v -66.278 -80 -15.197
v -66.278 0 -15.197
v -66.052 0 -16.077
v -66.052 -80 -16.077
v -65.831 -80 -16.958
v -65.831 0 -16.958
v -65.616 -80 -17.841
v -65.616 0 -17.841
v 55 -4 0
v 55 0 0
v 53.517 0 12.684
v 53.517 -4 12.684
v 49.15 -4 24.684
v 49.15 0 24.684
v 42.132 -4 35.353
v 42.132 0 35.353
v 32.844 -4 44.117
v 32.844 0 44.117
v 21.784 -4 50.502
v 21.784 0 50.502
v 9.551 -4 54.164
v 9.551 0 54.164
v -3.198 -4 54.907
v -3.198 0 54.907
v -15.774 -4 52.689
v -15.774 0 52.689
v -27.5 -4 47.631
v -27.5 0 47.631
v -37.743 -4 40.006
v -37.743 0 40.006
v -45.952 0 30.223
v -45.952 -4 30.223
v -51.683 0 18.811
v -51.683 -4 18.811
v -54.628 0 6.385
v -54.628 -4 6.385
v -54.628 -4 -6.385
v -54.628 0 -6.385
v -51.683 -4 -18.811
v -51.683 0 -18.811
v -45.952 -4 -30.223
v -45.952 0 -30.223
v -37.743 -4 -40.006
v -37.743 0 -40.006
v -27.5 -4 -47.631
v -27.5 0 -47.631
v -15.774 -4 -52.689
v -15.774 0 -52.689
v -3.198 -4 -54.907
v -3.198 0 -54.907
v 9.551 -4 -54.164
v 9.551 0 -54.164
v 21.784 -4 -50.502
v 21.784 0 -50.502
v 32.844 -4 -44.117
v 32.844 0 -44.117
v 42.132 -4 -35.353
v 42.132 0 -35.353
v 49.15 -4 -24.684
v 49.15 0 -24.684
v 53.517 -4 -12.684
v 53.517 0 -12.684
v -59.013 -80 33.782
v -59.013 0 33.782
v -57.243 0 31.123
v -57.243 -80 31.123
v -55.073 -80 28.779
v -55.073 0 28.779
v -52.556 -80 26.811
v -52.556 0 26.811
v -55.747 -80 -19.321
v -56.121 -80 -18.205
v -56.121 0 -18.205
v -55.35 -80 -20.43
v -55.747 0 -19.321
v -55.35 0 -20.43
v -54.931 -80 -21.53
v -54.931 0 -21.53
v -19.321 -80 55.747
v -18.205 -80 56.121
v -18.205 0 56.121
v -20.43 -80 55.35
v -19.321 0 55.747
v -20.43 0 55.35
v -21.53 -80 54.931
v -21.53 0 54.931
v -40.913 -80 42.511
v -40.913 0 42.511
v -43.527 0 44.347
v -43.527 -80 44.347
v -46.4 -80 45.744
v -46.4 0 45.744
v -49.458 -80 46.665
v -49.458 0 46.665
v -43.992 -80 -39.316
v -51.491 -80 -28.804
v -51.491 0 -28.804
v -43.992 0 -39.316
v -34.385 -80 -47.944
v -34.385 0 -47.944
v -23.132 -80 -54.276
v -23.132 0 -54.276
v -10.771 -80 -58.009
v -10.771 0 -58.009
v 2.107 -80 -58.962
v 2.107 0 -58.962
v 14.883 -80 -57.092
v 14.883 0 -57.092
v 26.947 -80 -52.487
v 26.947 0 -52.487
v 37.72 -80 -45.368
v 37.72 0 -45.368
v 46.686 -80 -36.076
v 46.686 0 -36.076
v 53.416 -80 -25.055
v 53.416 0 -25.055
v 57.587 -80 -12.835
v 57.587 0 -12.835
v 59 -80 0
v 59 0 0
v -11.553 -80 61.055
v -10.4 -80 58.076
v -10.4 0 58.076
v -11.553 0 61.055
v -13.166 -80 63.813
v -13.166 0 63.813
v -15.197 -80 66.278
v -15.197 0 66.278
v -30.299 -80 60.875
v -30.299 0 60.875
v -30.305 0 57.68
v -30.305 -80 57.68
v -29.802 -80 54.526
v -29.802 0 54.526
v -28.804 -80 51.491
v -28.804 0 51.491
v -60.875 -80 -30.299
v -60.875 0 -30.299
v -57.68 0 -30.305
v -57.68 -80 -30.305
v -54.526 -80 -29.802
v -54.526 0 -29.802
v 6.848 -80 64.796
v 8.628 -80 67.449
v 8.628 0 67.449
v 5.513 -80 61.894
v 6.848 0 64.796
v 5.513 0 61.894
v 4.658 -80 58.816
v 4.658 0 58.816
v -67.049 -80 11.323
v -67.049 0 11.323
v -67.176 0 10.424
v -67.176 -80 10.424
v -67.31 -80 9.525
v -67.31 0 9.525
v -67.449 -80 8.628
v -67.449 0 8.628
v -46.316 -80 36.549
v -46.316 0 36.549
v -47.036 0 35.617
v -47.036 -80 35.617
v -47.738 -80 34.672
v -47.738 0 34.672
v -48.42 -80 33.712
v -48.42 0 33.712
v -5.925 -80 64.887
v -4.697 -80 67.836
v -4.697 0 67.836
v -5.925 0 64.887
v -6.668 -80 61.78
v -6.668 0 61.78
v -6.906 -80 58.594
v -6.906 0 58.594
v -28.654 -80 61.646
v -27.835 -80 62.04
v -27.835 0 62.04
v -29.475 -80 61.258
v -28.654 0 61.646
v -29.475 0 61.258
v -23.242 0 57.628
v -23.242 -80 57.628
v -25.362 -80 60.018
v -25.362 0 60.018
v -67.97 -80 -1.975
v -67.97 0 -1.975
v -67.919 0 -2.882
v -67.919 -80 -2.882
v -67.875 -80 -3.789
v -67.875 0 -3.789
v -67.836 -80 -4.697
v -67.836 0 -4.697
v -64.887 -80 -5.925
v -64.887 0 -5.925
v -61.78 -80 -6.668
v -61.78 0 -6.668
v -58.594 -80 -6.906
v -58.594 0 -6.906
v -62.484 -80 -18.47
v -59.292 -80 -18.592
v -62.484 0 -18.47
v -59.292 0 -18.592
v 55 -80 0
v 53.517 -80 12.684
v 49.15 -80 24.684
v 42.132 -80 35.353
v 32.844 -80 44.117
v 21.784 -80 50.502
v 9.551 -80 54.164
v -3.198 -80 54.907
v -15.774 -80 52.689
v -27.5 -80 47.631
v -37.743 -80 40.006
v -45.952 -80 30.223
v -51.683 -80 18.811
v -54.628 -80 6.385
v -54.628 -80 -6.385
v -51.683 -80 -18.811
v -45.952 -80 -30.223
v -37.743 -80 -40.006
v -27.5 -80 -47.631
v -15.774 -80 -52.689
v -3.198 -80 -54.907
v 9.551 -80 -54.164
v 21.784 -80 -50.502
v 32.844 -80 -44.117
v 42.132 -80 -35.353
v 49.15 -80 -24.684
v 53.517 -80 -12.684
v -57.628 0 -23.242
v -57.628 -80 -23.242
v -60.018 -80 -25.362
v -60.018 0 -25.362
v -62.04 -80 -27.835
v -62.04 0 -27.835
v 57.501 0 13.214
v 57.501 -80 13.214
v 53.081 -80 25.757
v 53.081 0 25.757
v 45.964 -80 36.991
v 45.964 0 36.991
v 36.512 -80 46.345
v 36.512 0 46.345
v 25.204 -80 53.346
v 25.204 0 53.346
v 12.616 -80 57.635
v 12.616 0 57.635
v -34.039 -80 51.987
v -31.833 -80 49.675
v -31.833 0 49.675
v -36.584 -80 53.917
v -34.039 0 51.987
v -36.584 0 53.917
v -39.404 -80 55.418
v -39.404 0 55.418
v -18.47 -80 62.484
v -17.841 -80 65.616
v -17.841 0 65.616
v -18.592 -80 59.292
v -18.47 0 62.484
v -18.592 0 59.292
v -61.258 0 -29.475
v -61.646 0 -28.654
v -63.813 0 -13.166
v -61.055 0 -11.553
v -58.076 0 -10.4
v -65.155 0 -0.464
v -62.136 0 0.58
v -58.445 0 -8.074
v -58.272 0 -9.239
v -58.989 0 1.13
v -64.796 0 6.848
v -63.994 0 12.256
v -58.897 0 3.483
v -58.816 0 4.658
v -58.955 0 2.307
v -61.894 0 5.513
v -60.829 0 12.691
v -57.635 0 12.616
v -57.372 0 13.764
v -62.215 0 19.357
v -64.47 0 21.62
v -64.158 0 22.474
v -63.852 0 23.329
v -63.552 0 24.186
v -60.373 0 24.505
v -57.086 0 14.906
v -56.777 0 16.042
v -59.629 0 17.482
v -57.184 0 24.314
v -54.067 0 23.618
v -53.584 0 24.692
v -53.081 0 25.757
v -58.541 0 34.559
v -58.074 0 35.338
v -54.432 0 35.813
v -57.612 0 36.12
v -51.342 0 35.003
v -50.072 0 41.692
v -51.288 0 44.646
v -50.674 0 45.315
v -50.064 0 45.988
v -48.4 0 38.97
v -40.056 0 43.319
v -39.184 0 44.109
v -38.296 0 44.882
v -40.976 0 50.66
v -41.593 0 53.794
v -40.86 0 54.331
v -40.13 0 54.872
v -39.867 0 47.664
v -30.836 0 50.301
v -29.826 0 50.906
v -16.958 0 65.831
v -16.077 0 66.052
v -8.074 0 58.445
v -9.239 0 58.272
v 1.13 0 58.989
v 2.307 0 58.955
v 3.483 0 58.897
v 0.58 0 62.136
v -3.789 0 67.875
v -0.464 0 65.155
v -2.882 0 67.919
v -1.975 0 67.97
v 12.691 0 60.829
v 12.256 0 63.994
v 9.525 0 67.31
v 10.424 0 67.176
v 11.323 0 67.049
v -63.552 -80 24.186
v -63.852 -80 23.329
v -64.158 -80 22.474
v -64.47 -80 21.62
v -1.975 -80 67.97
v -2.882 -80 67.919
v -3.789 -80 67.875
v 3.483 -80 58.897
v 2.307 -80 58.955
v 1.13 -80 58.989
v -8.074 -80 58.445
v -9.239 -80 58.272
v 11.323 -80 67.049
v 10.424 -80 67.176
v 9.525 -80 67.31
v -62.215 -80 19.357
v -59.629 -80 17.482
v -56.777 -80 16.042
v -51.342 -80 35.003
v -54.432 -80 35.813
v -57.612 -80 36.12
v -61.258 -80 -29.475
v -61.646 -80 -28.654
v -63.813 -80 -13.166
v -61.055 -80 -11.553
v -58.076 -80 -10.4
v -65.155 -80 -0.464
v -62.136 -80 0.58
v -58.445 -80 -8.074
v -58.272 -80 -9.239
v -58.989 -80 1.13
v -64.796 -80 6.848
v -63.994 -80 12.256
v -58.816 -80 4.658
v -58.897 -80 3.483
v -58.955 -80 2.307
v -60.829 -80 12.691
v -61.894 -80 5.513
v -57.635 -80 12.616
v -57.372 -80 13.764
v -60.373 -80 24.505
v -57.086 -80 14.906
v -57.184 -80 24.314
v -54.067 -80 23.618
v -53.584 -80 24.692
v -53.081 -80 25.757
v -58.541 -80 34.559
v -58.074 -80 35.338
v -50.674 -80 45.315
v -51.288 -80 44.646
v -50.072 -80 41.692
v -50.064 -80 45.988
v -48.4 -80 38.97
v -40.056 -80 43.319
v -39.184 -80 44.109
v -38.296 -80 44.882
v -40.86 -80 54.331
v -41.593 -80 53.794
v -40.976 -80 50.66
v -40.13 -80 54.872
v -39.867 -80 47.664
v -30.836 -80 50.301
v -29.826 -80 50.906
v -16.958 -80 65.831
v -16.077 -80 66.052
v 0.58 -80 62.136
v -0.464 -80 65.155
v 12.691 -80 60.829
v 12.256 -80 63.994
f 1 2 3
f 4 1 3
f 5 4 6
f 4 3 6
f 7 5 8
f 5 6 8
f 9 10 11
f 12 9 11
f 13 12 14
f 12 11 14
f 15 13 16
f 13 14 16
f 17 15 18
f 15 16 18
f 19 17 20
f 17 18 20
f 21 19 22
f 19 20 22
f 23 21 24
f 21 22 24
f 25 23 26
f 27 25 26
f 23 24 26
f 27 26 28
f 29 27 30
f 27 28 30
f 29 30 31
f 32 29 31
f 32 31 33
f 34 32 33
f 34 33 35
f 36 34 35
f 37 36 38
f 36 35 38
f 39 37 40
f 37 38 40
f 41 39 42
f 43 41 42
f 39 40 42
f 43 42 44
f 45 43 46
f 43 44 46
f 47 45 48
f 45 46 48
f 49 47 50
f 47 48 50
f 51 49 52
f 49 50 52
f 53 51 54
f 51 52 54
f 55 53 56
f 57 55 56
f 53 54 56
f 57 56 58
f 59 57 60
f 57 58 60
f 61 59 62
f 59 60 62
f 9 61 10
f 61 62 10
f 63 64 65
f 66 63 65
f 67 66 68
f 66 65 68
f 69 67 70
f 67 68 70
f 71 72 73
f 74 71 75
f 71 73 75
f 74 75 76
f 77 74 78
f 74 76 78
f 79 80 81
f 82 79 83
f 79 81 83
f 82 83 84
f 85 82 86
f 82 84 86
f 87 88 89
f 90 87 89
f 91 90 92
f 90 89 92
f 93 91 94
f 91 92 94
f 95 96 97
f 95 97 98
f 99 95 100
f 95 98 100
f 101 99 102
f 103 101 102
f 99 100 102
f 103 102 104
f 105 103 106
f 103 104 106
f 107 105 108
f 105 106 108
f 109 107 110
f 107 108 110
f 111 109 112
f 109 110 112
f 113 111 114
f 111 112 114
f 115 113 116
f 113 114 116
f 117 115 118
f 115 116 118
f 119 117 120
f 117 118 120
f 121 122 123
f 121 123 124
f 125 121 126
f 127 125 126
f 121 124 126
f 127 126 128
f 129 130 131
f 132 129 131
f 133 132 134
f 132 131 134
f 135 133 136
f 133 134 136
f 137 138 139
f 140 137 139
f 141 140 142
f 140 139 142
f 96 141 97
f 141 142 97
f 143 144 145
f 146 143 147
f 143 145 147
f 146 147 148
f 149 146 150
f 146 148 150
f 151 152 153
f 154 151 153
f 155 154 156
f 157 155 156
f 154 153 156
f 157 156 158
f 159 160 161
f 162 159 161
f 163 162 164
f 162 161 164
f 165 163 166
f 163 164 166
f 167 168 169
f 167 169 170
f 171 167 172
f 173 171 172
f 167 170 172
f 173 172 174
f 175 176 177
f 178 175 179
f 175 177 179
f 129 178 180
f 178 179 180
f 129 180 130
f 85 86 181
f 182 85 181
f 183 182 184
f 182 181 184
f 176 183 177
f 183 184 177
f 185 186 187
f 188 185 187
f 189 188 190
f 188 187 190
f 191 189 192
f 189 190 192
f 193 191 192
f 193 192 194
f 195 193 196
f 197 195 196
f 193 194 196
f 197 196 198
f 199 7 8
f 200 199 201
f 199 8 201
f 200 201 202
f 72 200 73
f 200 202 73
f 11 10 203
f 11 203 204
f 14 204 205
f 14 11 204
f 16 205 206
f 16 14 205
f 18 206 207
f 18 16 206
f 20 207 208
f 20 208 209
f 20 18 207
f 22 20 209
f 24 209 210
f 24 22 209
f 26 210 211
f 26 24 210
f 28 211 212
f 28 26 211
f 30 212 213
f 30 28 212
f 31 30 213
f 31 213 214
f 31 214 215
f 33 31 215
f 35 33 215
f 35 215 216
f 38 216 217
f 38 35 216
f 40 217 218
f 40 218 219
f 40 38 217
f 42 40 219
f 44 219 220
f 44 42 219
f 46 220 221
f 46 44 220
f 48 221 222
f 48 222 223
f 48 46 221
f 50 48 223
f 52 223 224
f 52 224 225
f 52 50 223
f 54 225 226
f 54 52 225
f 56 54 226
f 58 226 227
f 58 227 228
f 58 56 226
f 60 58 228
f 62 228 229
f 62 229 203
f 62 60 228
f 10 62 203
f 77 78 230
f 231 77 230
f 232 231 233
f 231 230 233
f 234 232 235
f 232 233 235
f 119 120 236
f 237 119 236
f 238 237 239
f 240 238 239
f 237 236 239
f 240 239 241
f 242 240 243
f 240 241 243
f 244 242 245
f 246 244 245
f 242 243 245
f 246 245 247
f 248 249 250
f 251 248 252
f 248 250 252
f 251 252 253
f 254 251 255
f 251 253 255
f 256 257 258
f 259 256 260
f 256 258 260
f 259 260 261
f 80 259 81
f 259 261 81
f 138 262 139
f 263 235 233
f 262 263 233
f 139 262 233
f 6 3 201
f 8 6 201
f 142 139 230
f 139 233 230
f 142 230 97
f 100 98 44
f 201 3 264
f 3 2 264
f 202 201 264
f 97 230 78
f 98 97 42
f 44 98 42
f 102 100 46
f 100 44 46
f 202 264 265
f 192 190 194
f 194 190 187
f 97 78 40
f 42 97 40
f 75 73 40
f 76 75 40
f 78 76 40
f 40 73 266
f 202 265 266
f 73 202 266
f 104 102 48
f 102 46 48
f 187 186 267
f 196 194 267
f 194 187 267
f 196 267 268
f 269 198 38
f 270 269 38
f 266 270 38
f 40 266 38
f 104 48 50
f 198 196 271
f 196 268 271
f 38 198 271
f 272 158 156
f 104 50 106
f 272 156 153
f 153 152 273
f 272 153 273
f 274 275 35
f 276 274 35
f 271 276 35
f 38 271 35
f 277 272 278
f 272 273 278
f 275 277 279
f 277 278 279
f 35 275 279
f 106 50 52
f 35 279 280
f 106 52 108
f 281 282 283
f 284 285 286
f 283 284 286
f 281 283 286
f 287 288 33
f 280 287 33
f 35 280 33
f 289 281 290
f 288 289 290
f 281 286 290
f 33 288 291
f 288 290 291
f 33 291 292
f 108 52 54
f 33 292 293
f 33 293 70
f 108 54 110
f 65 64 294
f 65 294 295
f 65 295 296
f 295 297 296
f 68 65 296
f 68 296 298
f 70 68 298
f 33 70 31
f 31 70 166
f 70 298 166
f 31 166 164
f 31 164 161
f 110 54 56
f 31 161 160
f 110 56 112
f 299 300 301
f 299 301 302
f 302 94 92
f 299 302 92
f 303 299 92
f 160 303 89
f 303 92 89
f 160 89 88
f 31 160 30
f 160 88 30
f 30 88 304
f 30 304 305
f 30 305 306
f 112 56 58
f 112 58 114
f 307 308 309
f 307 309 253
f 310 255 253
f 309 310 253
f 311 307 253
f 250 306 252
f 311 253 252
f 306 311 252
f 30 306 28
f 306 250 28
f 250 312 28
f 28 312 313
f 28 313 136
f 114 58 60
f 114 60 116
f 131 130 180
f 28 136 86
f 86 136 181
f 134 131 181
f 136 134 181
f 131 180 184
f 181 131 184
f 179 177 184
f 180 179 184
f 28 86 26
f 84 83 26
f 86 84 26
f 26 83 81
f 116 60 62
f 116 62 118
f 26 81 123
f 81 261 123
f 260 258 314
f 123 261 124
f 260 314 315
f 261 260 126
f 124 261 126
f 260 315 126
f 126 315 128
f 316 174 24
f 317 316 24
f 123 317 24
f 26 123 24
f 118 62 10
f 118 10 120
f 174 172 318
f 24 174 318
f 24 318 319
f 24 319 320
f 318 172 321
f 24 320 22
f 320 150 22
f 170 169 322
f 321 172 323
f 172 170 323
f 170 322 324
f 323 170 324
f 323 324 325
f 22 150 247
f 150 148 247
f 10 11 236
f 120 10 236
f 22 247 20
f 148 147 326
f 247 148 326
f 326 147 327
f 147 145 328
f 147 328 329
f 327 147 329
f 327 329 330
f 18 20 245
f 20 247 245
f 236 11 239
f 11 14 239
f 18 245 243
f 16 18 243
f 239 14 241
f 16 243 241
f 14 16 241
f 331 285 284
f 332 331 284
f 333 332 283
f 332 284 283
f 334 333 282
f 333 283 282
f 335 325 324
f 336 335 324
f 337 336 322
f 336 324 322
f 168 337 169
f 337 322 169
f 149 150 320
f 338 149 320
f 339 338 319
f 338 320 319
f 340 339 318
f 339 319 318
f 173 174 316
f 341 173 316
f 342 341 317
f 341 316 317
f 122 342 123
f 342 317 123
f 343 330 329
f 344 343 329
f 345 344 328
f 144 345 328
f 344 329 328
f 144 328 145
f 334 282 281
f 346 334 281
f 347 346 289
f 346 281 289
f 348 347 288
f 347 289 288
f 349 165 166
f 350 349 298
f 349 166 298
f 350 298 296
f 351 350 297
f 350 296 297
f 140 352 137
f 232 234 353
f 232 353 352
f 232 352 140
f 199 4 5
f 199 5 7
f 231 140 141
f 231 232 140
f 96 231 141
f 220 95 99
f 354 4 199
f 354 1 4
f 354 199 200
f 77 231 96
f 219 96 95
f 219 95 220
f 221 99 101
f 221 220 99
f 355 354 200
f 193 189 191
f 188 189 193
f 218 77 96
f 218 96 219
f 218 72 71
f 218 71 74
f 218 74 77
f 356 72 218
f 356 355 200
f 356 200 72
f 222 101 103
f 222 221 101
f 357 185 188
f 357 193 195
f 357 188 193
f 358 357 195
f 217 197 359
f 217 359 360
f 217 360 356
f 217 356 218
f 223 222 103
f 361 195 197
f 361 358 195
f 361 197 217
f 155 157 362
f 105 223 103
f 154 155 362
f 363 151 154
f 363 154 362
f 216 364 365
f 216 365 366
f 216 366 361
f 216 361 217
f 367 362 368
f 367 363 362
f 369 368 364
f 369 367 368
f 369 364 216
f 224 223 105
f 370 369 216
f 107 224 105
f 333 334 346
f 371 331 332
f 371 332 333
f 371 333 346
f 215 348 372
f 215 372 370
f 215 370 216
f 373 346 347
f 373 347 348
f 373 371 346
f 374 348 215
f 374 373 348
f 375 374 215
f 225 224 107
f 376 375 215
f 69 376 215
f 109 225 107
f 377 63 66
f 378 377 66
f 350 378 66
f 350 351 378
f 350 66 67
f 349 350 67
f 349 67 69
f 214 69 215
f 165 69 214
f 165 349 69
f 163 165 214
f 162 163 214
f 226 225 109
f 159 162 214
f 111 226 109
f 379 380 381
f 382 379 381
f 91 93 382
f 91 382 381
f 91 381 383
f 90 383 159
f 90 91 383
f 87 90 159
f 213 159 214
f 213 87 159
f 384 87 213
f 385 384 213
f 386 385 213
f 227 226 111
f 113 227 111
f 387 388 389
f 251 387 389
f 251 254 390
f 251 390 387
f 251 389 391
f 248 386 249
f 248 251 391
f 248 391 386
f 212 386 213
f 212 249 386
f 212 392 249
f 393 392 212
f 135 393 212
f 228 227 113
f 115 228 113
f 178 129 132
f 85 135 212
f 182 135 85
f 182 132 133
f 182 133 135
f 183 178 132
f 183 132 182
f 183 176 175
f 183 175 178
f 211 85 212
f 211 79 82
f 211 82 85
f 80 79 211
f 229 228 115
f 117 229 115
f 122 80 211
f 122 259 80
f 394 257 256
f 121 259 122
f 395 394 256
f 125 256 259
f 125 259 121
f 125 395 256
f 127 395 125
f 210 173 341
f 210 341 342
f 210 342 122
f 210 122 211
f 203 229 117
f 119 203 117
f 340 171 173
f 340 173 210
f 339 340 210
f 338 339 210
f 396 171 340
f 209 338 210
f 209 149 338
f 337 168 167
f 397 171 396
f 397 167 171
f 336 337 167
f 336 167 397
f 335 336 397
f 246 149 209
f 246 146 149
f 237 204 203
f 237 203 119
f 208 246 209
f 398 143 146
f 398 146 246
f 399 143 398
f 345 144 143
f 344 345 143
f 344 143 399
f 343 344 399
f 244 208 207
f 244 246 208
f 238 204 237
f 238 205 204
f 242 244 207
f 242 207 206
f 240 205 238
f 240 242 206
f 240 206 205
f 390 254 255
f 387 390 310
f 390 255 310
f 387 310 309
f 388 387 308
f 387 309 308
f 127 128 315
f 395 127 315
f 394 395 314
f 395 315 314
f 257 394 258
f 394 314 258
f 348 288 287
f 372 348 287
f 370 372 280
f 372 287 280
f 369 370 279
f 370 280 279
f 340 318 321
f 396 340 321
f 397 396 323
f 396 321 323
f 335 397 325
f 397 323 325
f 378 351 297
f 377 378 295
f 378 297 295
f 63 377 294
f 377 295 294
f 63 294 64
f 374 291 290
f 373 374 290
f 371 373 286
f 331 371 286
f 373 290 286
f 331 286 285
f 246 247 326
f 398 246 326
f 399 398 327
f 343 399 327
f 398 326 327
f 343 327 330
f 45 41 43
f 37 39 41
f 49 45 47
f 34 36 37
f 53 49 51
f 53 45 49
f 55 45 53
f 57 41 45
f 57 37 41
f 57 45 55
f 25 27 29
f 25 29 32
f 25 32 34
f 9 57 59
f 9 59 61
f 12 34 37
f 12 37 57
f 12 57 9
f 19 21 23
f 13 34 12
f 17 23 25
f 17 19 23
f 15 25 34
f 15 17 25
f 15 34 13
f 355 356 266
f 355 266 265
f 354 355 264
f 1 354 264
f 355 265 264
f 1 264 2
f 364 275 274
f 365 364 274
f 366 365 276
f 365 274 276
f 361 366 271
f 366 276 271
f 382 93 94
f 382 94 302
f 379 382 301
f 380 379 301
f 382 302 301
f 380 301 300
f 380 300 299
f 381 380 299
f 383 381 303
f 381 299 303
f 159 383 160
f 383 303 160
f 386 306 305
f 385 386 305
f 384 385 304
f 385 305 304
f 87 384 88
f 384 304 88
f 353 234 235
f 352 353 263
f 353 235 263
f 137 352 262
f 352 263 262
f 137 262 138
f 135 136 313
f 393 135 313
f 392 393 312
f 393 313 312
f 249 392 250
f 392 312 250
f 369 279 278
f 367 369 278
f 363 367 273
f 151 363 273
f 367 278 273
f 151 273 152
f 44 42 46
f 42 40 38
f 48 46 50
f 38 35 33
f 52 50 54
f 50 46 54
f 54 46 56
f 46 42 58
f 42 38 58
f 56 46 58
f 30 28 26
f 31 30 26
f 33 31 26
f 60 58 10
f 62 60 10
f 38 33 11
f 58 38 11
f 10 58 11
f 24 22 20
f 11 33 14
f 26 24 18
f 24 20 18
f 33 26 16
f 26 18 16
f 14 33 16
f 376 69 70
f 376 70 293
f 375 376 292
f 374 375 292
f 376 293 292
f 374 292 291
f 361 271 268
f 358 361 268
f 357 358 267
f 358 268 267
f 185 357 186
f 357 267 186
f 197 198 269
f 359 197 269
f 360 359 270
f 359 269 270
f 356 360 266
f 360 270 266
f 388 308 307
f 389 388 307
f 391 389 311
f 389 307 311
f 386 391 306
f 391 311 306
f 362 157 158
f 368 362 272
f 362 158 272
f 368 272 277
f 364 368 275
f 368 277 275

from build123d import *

# Parameters (mm, degrees)
F0_R     = 55
F1_DEPTH = 80
F2_DEPTH = 80
F3_DEPTH = 4


with BuildPart() as f1:
    # F0 (on Front) → F1 (new body)
    with BuildSketch(Plane.XZ):
        with BuildLine():
            ThreePointArc((-51.4911909934, -28.8037714558), (14.8832075069, -57.0919445658), (59, 0))
            ThreePointArc((59, 0), (45.9639360321, 36.9907635016), (12.6163869683, 57.6352910973))
            ThreePointArc((12.6163869683, 57.6352910973), (8.6570979929, 58.3614140879), (4.6575122934, 58.8158786319))
            ThreePointArc((4.6575122934, 58.8158786319), (2.8949927853, 58.9289319161), (1.1298791308, 58.9891801363))
            ThreePointArc((1.1298791308, 58.9891801363), (-2.8949927853, 58.9289319161), (-6.9063892013, 58.5943835892))
            ThreePointArc((-6.9063892013, 58.5943835892), (-8.6570979929, 58.3614140879), (-10.4000493282, 58.0761480642))
            ThreePointArc((-10.4000493282, 58.0761480642), (-14.3358306143, 57.2318439385), (-18.2048820321, 56.1211392454))
            ThreePointArc((-18.2048820321, 56.1211392454), (-19.8765013501, 55.5510998458), (-21.5303097238, 54.9312821914))
            ThreePointArc((-21.5303097238, 54.9312821914), (-25.2257505124, 53.3353682943), (-28.8037714558, 51.4911909934))
            ThreePointArc((-28.8037714558, 51.4911909934), (-30.3320619074, 50.60598799), (-31.8331723911, 49.6754379499))
            ThreePointArc((-31.8331723911, 49.6754379499), (-35.1462589651, 47.3892443574), (-38.2957480959, 44.8824651482))
            ThreePointArc((-38.2957480959, 44.8824651482), (-39.621978336, 43.7161163959), (-40.9127040957, 42.5105944863))
            ThreePointArc((-40.9127040957, 42.5105944863), (-43.7161163959, 39.621978336), (-46.3160406131, 36.5489313377))
            ThreePointArc((-46.3160406131, 36.5489313377), (-47.3892443574, 35.1462589651), (-48.419983526, 33.7120927168))
            ThreePointArc((-48.419983526, 33.7120927168), (-50.60598799, 30.3320619074), (-52.5564336639, 26.8108425927))
            ThreePointArc((-52.5564336639, 26.8108425927), (-53.3353682943, 25.2257505124), (-54.0665101436, 23.6180541301))
            ThreePointArc((-54.0665101436, 23.6180541301), (-55.5510998458, 19.8765013501), (-56.777112443, 16.0424282026))
            ThreePointArc((-56.777112443, 16.0424282026), (-57.2318439385, 14.3358306143), (-57.6352910973, 12.6163869683))
            ThreePointArc((-57.6352910973, 12.6163869683), (-58.3614140879, 8.6570979929), (-58.8158786319, 4.6575122934))
            ThreePointArc((-58.8158786319, 4.6575122934), (-58.9289319161, 2.8949927853), (-58.9891801363, 1.1298791308))
            ThreePointArc((-58.9891801363, 1.1298791308), (-58.9289319161, -2.8949927853), (-58.5943835892, -6.9063892013))
            ThreePointArc((-58.5943835892, -6.9063892013), (-58.3614140879, -8.6570979929), (-58.0761480642, -10.4000493282))
            ThreePointArc((-58.0761480642, -10.4000493282), (-57.2318439385, -14.3358306143), (-56.1211392454, -18.2048820321))
            ThreePointArc((-56.1211392454, -18.2048820321), (-55.5510998458, -19.8765013501), (-54.9312821914, -21.5303097238))
            ThreePointArc((-54.9312821914, -21.5303097238), (-53.3353682943, -25.2257505124), (-51.4911909934, -28.8037714558))
        make_face()
        Circle(F0_R, mode=Mode.SUBTRACT)
    extrude(amount=F1_DEPTH)

    # F0 (on Front) → F2 (join)
    with BuildSketch(Plane.XZ):
        with BuildLine():
            ThreePointArc((-51.4911909934, -28.8037714558), (14.8832075069, -57.0919445658), (59, 0))
            ThreePointArc((59, 0), (45.9639360321, 36.9907635016), (12.6163869683, 57.6352910973))
            ThreePointArc((12.6163869683, 57.6352910973), (8.6570979929, 58.3614140879), (4.6575122934, 58.8158786319))
            ThreePointArc((4.6575122934, 58.8158786319), (2.8949927853, 58.9289319161), (1.1298791308, 58.9891801363))
            ThreePointArc((1.1298791308, 58.9891801363), (-2.8949927853, 58.9289319161), (-6.9063892013, 58.5943835892))
            ThreePointArc((-6.9063892013, 58.5943835892), (-8.6570979929, 58.3614140879), (-10.4000493282, 58.0761480642))
            ThreePointArc((-10.4000493282, 58.0761480642), (-14.3358306143, 57.2318439385), (-18.2048820321, 56.1211392454))
            ThreePointArc((-18.2048820321, 56.1211392454), (-19.8765013501, 55.5510998458), (-21.5303097238, 54.9312821914))
            ThreePointArc((-21.5303097238, 54.9312821914), (-25.2257505124, 53.3353682943), (-28.8037714558, 51.4911909934))
            ThreePointArc((-28.8037714558, 51.4911909934), (-30.3320619074, 50.60598799), (-31.8331723911, 49.6754379499))
            ThreePointArc((-31.8331723911, 49.6754379499), (-35.1462589651, 47.3892443574), (-38.2957480959, 44.8824651482))
            ThreePointArc((-38.2957480959, 44.8824651482), (-39.621978336, 43.7161163959), (-40.9127040957, 42.5105944863))
            ThreePointArc((-40.9127040957, 42.5105944863), (-43.7161163959, 39.621978336), (-46.3160406131, 36.5489313377))
            ThreePointArc((-46.3160406131, 36.5489313377), (-47.3892443574, 35.1462589651), (-48.419983526, 33.7120927168))
            ThreePointArc((-48.419983526, 33.7120927168), (-50.60598799, 30.3320619074), (-52.5564336639, 26.8108425927))
            ThreePointArc((-52.5564336639, 26.8108425927), (-53.3353682943, 25.2257505124), (-54.0665101436, 23.6180541301))
            ThreePointArc((-54.0665101436, 23.6180541301), (-55.5510998458, 19.8765013501), (-56.777112443, 16.0424282026))
            ThreePointArc((-56.777112443, 16.0424282026), (-57.2318439385, 14.3358306143), (-57.6352910973, 12.6163869683))
            ThreePointArc((-57.6352910973, 12.6163869683), (-58.3614140879, 8.6570979929), (-58.8158786319, 4.6575122934))
            ThreePointArc((-58.8158786319, 4.6575122934), (-58.9289319161, 2.8949927853), (-58.9891801363, 1.1298791308))
            ThreePointArc((-58.9891801363, 1.1298791308), (-58.9289319161, -2.8949927853), (-58.5943835892, -6.9063892013))
            ThreePointArc((-58.5943835892, -6.9063892013), (-58.3614140879, -8.6570979929), (-58.0761480642, -10.4000493282))
            ThreePointArc((-58.0761480642, -10.4000493282), (-57.2318439385, -14.3358306143), (-56.1211392454, -18.2048820321))
            ThreePointArc((-56.1211392454, -18.2048820321), (-55.5510998458, -19.8765013501), (-54.9312821914, -21.5303097238))
            ThreePointArc((-54.9312821914, -21.5303097238), (-53.3353682943, -25.2257505124), (-51.4911909934, -28.8037714558))
        make_face()
        Circle(F0_R, mode=Mode.SUBTRACT)
        with BuildLine():
            ThreePointArc((4.6575122934, 58.8158786319), (8.6570979929, 58.3614140879), (12.6163869683, 57.6352910973))
            ThreePointArc((12.6163869683, 57.6352910973), (12.5370476129, 62.4200348178), (11.3233557269, 67.048967655))
            ThreePointArc((11.3233557269, 67.048967655), (9.9744720661, 67.2424287026), (8.627512105, 67.4488582809))
            ThreePointArc((8.627512105, 67.4488582809), (6.1223731095, 63.371561895), (4.6575122934, 58.8158786319))
        make_face()
        with BuildLine():
            ThreePointArc((-60.8748649556, -30.2990637669), (-56.092936255, -30.1167862131), (-51.4911909934, -28.8037714558))
            ThreePointArc((-51.4911909934, -28.8037714558), (-53.3353682943, -25.2257505124), (-54.9312821914, -21.5303097238))
            ThreePointArc((-54.9312821914, -21.5303097238), (-58.8655726136, -24.2545391707), (-62.0400985212, -27.8353843876))
            ThreePointArc((-62.0400985212, -27.8353843876), (-61.4515558937, -29.0644213614), (-60.8748649556, -30.2990637669))
        make_face()
        with BuildLine():
            ThreePointArc((-6.9063892013, 58.5943835892), (-2.8949927853, 58.9289319161), (1.1298791308, 58.9891801363))
            ThreePointArc((1.1298791308, 58.9891801363), (0.1186070656, 63.6665080075), (-1.9748240689, 67.9697176573))
            ThreePointArc((-1.9748240689, 67.9697176573), (-3.3355316865, 67.8963072574), (-4.6968826025, 67.8359914967))
            ThreePointArc((-4.6968826025, 67.8359914967), (-6.3584449898, 63.3483108443), (-6.9063892013, 58.5943835892))
        make_face()
        with BuildLine():
            ThreePointArc((-65.6162256021, -17.8407787457), (-60.8906197339, -18.5949116141), (-56.1211392454, -18.2048820321))
            ThreePointArc((-56.1211392454, -18.2048820321), (-57.2318439385, -14.3358306143), (-58.0761480642, -10.4000493282))
            ThreePointArc((-58.0761480642, -10.4000493282), (-62.4663129991, -12.3043914847), (-66.2784295279, -15.1971124833))
            ThreePointArc((-66.2784295279, -15.1971124833), (-65.940968801, -16.517352827), (-65.6162256021, -17.8407787457))
        make_face()
        with BuildLine():
            ThreePointArc((-18.2048820321, 56.1211392454), (-14.3358306143, 57.2318439385), (-10.4000493282, 58.0761480642))
            ThreePointArc((-10.4000493282, 58.0761480642), (-12.3043914847, 62.4663129991), (-15.1971124833, 66.2784295279))
            ThreePointArc((-15.1971124833, 66.2784295279), (-16.517352827, 65.940968801), (-17.8407787457, 65.6162256021))
            ThreePointArc((-17.8407787457, 65.6162256021), (-18.5949116141, 60.8906197339), (-18.2048820321, 56.1211392454))
        make_face()
        with BuildLine():
            ThreePointArc((-67.8359914967, -4.6968826025), (-63.3483108443, -6.3584449898), (-58.5943835892, -6.9063892013))
            ThreePointArc((-58.5943835892, -6.9063892013), (-58.9289319161, -2.8949927853), (-58.9891801363, 1.1298791308))
            ThreePointArc((-58.9891801363, 1.1298791308), (-63.6665080075, 0.1186070656), (-67.9697176573, -1.9748240689))
            ThreePointArc((-67.9697176573, -1.9748240689), (-67.8963072574, -3.3355316865), (-67.8359914967, -4.6968826025))
        make_face()
        with BuildLine():
            ThreePointArc((-28.8037714558, 51.4911909934), (-25.2257505124, 53.3353682943), (-21.5303097238, 54.9312821914))
            ThreePointArc((-21.5303097238, 54.9312821914), (-24.2545391707, 58.8655726136), (-27.8353843876, 62.0400985212))
            ThreePointArc((-27.8353843876, 62.0400985212), (-29.0644213614, 61.4515558937), (-30.2990637669, 60.8748649556))
            ThreePointArc((-30.2990637669, 60.8748649556), (-30.1167862131, 56.092936255), (-28.8037714558, 51.4911909934))
        make_face()
        with BuildLine():
            ThreePointArc((-67.4488582809, 8.627512105), (-63.371561895, 6.1223731095), (-58.8158786319, 4.6575122934))
            ThreePointArc((-58.8158786319, 4.6575122934), (-58.3614140879, 8.6570979929), (-57.6352910973, 12.6163869683))
            ThreePointArc((-57.6352910973, 12.6163869683), (-62.4200348178, 12.5370476129), (-67.048967655, 11.3233557269))
            ThreePointArc((-67.048967655, 11.3233557269), (-67.2424287026, 9.9744720661), (-67.4488582809, 8.627512105))
        make_face()
        with BuildLine():
            ThreePointArc((-38.2957480959, 44.8824651482), (-35.1462589651, 47.3892443574), (-31.8331723911, 49.6754379499))
            ThreePointArc((-31.8331723911, 49.6754379499), (-35.2725985184, 53.0026612847), (-39.4039580801, 55.4176013207))
            ThreePointArc((-39.4039580801, 55.4176013207), (-40.4945604824, 54.6005941558), (-41.5929727595, 53.7941173879))
            ThreePointArc((-41.5929727595, 53.7941173879), (-40.4812896077, 49.1396326931), (-38.2957480959, 44.8824651482))
        make_face()
        with BuildLine():
            ThreePointArc((-64.4697032671, 21.6203563608), (-60.9594793614, 18.3679118437), (-56.777112443, 16.0424282026))
            ThreePointArc((-56.777112443, 16.0424282026), (-55.5510998458, 19.8765013501), (-54.0665101436, 23.6180541301))
            ThreePointArc((-54.0665101436, 23.6180541301), (-58.7747946957, 24.4736964513), (-63.5515634272, 24.1863853124))
            ThreePointArc((-63.5515634272, 24.1863853124), (-64.0044613228, 22.9011624509), (-64.4697032671, 21.6203563608))
        make_face()
        with BuildLine():
            ThreePointArc((-46.3160406131, 36.5489313377), (-43.7161163959, 39.621978336), (-40.9127040957, 42.5105944863))
            ThreePointArc((-40.9127040957, 42.5105944863), (-44.9351516862, 45.102887407), (-49.4582597616, 46.66543678))
            ThreePointArc((-49.4582597616, 46.66543678), (-50.3685163537, 45.6513622048), (-51.2884871345, 44.6460920571))
            ThreePointArc((-51.2884871345, 44.6460920571), (-49.2901197448, 40.2979206046), (-46.3160406131, 36.5489313377))
        make_face()
        with BuildLine():
            ThreePointArc((-59.0130137119, 33.7823424464), (-56.2047582223, 29.9075820266), (-52.5564336639, 26.8108425927))
            ThreePointArc((-52.5564336639, 26.8108425927), (-50.60598799, 30.3320619074), (-48.419983526, 33.7120927168))
            ThreePointArc((-48.419983526, 33.7120927168), (-52.8708721746, 35.4698348601), (-57.611908257, 36.1199456742))
            ThreePointArc((-57.611908257, 36.1199456742), (-58.3068383884, 34.9477740059), (-59.0130137119, 33.7823424464))
        make_face()
    extrude(amount=F2_DEPTH)


with BuildPart() as f3:
    # F0 (on Front) → F3 (new body)
    with BuildSketch(Plane.XZ):
        Circle(F0_R)
    extrude(amount=F3_DEPTH)


solid = Compound([f1.part, f3.part])
